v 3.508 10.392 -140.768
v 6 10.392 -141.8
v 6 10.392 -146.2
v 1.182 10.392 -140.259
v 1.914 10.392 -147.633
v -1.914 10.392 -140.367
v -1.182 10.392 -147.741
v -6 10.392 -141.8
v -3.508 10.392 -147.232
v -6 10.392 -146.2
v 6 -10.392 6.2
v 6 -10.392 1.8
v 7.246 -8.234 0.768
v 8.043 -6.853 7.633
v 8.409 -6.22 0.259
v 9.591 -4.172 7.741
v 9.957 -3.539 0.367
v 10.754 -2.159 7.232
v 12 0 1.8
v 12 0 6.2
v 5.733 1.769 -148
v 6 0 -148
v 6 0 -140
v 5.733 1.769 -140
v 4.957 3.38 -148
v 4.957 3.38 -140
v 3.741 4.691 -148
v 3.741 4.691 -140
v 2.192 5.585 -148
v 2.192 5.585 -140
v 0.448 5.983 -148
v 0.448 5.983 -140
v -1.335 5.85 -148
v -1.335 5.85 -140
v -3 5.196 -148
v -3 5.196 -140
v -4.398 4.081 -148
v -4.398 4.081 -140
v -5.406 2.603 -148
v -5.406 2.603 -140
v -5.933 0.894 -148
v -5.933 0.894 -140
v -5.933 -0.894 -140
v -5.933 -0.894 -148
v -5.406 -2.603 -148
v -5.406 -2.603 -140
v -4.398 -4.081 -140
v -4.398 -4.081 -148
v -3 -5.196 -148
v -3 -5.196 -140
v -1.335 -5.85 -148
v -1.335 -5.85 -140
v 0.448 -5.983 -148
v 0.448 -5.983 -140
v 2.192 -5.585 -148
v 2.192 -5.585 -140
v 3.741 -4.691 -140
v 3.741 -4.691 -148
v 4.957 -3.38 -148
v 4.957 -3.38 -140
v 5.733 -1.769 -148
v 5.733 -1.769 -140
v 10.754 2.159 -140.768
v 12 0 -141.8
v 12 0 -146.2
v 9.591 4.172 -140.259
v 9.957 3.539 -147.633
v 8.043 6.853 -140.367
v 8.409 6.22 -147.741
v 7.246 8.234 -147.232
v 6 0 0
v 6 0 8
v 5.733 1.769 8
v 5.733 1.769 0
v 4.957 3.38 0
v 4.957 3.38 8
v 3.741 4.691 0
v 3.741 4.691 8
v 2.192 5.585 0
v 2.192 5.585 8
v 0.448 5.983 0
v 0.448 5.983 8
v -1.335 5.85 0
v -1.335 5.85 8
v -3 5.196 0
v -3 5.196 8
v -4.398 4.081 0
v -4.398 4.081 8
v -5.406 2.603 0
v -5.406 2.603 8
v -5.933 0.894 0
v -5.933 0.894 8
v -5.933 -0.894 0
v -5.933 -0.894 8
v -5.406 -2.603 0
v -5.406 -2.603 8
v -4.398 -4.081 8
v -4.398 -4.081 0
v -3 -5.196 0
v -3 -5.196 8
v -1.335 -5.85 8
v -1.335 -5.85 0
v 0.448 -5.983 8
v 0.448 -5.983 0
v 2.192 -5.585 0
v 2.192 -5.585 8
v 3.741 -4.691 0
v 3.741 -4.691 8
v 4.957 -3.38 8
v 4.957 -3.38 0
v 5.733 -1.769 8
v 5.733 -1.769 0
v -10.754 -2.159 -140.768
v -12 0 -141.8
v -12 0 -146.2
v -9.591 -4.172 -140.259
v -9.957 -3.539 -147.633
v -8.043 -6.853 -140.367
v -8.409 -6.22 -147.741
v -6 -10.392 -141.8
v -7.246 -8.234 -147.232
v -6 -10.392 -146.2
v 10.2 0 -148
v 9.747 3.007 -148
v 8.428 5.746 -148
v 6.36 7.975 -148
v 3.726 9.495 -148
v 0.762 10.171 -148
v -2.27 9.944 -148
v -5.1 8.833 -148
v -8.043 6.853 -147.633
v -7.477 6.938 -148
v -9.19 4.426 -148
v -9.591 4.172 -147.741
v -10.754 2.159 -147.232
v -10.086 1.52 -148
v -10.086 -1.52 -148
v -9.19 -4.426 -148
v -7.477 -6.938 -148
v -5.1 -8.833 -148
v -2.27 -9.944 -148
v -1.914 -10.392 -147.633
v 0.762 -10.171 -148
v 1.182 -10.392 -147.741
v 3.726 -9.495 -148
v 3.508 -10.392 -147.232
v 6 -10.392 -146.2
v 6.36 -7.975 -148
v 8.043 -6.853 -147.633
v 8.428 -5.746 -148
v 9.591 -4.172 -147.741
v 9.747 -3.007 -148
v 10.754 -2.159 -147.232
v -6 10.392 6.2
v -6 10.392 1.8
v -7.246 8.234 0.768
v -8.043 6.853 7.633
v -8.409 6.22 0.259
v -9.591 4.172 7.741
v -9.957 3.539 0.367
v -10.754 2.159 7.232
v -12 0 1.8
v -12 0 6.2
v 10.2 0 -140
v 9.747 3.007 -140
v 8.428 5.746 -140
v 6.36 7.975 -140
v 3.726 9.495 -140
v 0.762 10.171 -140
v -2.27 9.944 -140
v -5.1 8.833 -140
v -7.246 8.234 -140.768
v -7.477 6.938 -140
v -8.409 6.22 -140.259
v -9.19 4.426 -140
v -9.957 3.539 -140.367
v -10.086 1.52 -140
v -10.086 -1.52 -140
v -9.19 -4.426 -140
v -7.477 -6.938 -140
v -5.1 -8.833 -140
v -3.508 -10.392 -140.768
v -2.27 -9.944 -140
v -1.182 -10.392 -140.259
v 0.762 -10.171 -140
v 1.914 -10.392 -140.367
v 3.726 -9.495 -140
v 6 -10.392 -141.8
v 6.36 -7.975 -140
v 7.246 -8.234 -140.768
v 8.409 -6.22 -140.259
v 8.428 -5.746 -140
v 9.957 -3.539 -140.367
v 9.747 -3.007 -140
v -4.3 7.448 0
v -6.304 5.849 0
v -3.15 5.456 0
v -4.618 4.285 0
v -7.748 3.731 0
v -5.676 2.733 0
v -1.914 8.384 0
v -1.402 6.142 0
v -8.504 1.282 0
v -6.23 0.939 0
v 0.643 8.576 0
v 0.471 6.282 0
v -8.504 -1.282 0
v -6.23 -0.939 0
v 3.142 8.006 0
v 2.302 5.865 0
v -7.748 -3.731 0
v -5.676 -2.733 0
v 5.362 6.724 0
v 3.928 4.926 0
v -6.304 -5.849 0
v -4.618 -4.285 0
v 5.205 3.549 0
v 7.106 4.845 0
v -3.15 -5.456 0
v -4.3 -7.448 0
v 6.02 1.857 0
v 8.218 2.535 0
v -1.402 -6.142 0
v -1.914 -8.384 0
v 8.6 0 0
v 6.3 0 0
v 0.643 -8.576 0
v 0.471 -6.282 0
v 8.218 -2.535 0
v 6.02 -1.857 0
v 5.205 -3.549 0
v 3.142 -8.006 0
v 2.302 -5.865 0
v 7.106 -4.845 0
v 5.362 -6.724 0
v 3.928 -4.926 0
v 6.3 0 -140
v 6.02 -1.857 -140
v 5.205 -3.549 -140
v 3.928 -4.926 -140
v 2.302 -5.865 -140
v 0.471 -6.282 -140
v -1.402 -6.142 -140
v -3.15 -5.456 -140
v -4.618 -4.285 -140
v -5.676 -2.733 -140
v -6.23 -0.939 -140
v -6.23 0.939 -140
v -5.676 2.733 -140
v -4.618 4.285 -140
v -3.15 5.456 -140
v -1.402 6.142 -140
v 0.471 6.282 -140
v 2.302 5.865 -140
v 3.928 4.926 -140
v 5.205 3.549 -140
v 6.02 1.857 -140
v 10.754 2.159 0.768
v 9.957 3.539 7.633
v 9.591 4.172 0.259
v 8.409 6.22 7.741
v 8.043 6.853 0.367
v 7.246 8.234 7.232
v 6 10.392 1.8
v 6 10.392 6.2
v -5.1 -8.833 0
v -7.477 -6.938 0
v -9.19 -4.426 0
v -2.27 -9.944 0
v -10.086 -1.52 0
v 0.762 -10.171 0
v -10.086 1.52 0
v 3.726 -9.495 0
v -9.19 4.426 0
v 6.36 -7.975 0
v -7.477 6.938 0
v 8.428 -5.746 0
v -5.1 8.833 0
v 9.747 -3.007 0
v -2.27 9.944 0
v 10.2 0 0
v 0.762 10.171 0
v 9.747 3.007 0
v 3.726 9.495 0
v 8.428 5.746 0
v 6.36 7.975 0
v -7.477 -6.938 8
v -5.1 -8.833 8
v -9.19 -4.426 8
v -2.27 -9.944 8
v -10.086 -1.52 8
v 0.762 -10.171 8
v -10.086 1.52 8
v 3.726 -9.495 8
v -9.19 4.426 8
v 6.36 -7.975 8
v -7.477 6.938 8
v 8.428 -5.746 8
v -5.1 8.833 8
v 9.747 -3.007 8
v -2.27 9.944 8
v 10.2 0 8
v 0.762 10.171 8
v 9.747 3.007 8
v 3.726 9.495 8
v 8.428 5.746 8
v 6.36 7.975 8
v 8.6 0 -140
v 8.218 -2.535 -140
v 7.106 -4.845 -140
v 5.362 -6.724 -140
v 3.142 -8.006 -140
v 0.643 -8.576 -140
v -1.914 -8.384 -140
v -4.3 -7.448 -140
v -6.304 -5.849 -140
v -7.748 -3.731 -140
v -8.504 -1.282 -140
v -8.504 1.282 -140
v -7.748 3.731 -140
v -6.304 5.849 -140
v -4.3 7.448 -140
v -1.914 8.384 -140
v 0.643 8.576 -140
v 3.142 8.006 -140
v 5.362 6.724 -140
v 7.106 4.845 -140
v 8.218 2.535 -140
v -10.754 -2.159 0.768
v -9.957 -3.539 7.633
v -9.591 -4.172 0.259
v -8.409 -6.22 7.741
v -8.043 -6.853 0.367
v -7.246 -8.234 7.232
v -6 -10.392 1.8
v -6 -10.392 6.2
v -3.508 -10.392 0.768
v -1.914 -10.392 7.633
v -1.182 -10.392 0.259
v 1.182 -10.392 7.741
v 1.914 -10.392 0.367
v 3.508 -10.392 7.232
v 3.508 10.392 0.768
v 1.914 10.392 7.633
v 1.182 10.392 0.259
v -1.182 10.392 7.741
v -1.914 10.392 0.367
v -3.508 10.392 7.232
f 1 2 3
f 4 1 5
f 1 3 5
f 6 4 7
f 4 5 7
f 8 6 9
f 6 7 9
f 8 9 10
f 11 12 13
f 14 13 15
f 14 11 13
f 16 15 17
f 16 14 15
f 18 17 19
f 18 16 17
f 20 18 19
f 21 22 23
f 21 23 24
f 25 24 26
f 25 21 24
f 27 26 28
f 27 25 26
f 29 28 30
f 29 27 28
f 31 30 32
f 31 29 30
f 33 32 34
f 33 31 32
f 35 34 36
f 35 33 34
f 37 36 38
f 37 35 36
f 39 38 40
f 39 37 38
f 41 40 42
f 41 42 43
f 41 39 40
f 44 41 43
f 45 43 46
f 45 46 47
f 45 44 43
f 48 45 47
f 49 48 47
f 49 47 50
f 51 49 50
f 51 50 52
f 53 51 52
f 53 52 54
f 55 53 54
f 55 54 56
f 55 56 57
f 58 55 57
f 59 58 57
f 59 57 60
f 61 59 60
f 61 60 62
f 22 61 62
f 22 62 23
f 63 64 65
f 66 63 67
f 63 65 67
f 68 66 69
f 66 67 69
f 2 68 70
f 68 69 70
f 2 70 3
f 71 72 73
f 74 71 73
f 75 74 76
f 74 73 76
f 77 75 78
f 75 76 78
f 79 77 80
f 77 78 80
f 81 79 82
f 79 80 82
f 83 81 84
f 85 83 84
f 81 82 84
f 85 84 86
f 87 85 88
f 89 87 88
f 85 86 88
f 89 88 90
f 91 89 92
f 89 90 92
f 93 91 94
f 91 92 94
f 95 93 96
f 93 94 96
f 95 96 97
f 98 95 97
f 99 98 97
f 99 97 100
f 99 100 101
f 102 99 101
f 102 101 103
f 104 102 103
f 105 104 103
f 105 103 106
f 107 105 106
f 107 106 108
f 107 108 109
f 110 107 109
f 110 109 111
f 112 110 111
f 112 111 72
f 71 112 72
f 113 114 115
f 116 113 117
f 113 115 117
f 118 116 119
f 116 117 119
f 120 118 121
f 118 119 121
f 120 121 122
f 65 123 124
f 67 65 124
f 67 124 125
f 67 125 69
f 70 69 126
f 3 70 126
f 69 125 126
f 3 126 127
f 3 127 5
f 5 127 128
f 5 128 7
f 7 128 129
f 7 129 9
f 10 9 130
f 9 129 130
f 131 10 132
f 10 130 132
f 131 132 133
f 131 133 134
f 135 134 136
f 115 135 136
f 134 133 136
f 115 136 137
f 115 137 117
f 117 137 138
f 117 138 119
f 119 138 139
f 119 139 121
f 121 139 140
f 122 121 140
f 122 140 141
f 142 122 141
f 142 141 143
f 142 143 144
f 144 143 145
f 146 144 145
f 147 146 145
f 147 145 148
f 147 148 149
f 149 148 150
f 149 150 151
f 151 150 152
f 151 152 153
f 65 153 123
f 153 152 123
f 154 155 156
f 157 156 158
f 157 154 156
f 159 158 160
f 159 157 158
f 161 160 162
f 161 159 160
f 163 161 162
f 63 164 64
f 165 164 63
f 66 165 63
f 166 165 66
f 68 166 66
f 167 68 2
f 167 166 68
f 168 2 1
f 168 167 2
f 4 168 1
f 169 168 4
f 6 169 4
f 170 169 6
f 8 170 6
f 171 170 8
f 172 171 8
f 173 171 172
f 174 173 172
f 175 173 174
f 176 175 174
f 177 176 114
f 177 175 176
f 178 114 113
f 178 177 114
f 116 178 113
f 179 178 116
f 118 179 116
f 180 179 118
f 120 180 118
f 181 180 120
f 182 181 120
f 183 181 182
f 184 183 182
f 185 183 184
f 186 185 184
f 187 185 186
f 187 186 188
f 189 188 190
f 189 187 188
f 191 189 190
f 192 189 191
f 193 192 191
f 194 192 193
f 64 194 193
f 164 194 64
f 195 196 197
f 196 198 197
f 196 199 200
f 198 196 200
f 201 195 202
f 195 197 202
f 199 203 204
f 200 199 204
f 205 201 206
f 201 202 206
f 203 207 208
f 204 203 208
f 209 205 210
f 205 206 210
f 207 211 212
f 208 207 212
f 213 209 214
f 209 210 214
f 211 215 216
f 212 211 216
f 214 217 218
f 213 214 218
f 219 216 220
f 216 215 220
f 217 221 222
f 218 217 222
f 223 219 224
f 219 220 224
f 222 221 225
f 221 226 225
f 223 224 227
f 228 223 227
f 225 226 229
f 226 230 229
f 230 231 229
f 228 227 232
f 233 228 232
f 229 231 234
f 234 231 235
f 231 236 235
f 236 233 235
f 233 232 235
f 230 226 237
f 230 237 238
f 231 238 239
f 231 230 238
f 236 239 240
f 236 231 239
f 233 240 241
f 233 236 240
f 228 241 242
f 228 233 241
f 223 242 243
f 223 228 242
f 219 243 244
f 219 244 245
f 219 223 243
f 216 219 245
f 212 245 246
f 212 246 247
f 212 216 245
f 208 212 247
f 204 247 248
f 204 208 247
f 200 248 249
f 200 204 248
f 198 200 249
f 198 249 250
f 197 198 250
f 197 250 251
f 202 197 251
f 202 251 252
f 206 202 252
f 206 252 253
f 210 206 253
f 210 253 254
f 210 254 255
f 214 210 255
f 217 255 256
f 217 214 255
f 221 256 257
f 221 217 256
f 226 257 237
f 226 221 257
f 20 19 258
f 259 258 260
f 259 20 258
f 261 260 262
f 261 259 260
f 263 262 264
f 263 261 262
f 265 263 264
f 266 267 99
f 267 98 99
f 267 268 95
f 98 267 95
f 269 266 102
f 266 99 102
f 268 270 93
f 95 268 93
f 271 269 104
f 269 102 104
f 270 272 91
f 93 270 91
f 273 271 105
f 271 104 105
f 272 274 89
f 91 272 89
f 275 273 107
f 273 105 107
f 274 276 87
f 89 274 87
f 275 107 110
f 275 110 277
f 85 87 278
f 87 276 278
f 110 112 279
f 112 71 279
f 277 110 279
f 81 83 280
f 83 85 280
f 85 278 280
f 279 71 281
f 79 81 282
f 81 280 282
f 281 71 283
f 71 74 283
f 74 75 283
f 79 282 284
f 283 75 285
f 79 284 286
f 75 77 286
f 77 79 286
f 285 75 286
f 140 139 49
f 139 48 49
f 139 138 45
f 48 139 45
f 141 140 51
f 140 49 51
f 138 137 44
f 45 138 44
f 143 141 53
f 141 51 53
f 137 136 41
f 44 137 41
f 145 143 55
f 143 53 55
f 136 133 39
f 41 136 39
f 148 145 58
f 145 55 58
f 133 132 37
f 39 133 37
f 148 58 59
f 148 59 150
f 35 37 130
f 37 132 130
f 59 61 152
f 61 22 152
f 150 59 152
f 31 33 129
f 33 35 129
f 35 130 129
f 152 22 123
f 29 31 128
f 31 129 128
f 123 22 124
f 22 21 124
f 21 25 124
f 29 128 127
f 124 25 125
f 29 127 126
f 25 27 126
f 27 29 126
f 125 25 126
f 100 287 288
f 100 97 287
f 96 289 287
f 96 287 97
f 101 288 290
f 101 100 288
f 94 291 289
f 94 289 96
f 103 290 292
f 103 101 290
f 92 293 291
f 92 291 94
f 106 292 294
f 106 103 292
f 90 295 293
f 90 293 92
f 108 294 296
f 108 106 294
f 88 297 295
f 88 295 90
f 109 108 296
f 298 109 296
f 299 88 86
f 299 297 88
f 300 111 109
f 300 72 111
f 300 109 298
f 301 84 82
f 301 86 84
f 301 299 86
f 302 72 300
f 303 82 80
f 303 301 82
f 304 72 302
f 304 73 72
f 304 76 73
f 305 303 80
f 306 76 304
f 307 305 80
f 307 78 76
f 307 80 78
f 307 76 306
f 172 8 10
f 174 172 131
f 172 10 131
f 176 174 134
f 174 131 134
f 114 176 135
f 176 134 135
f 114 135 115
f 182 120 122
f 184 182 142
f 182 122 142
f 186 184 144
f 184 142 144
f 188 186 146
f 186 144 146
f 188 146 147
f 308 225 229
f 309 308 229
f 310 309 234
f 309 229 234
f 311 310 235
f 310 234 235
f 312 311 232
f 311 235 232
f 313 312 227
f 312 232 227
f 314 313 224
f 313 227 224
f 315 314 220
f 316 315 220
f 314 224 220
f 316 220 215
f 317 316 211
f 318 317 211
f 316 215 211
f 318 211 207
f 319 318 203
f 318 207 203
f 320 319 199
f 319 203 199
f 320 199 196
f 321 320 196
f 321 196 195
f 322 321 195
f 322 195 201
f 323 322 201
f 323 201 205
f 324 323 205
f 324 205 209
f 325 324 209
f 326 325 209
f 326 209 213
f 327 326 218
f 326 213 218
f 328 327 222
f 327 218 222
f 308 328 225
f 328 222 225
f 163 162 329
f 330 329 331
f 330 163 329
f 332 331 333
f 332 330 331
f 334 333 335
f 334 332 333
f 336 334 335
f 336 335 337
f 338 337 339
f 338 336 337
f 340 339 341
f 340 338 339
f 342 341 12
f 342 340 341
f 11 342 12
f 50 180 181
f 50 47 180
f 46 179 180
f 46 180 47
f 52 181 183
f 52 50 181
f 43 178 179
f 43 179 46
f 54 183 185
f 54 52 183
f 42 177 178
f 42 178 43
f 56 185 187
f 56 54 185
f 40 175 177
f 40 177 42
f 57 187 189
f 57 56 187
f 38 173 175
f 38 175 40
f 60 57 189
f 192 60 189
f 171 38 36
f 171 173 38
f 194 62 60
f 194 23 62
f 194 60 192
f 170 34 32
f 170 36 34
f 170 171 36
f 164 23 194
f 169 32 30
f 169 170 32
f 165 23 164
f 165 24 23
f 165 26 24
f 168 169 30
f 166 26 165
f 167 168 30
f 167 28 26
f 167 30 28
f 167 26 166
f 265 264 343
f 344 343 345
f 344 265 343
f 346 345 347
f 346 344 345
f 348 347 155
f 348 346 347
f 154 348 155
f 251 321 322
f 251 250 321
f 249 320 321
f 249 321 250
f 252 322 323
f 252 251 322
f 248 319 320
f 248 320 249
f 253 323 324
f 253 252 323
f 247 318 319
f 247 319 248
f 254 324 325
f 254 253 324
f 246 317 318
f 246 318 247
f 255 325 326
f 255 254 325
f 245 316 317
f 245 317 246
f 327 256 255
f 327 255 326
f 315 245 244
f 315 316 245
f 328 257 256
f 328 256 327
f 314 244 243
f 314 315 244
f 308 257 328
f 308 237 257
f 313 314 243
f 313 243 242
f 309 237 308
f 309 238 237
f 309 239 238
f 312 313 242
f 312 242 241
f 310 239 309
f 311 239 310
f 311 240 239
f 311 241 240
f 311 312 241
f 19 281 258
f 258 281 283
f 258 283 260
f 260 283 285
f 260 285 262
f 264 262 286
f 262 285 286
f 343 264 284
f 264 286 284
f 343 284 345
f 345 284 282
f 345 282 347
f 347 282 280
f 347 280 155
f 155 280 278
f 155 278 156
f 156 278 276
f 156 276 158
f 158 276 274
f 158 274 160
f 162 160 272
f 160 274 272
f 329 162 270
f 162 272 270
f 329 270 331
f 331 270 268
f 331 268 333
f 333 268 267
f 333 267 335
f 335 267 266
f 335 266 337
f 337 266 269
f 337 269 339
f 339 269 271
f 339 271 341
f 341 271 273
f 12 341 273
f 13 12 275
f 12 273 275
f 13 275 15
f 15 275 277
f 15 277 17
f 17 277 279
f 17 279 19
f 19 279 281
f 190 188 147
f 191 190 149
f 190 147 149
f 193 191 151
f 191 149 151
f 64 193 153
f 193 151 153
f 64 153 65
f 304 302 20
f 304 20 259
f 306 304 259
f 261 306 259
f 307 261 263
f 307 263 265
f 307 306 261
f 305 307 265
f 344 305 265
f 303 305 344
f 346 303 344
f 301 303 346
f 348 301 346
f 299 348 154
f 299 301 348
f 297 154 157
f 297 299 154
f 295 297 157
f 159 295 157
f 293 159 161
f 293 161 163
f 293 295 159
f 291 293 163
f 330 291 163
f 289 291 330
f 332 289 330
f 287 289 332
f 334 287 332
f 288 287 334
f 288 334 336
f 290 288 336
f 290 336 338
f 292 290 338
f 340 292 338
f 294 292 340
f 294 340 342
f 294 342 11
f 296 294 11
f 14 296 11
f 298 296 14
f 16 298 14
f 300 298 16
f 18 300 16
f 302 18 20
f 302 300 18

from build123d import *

# Parameters (mm, degrees)
SKETCH1_R                                    = 8.6
SKETCH1_R_2                                  = 6.3
CIRCULAR_HOLLOW_SECTION_C250_AS_17_2X2_DEPTH = 140
SKETCH2_R                                    = 12
BOSS_EXTRUDE1_DEPTH                          = 8
CHAMFER1_SIZE                                = 1.8
SKETCH3_R                                    = 6
CUT_EXTRUDE1_DEPTH                           = 16


with BuildPart() as part:
    # Sketch1 → Circular hollow section (c250) as 17.2X2.3 CHS C250(1) (new body)
    with BuildSketch(Plane(origin=(0, 0, 0), x_dir=(1, 0, 0), z_dir=(0, 0, -1))):
        Circle(SKETCH1_R)
        Circle(SKETCH1_R_2, mode=Mode.SUBTRACT)
    extrude(amount=CIRCULAR_HOLLOW_SECTION_C250_AS_17_2X2_DEPTH)


with BuildPart() as body_2:
    # Sketch2 → Boss-Extrude1 (new body)
    with BuildSketch(Plane.XY):
        Circle(SKETCH2_R)
    extrude(amount=BOSS_EXTRUDE1_DEPTH)

    # Chamfer1
    chamfer1_edges = [body_2.edges().sort_by_distance(p)[0] for p in [
        (-12, 0, 0),
        (-12, 0, 8),
    ]]
    chamfer(chamfer1_edges, length=CHAMFER1_SIZE)

    # Sketch3 → Cut-Extrude1 (cut)
    # profile 1 of 2: a face of its own
    with BuildSketch(Plane.XY.offset(8)):
        Polygon((14.309401077, 0), (7.154700538, 12.392304845), (-7.154700538, 12.392304845), (-14.309401077, 0), (-7.154700538, -12.392304845), (7.154700538, -12.392304845), align=None)
        Polygon((6, -10.392304845), (12, 0), (6, 10.392304845), (-6, 10.392304845), (-12, 0), (-6, -10.392304845), align=None, mode=Mode.SUBTRACT)
    # profile 2 of 2: a face of its own
    with BuildSketch(Plane.XY.offset(8)):
        Circle(SKETCH3_R)
    extrude(amount=-CUT_EXTRUDE1_DEPTH, mode=Mode.SUBTRACT)


with BuildPart() as body_3:
    # Mirror1: mirrored copy
    add(body_2.part.mirror(Plane.XY.offset(-70)))


solid = Compound([part.part, body_2.part, body_3.part])
